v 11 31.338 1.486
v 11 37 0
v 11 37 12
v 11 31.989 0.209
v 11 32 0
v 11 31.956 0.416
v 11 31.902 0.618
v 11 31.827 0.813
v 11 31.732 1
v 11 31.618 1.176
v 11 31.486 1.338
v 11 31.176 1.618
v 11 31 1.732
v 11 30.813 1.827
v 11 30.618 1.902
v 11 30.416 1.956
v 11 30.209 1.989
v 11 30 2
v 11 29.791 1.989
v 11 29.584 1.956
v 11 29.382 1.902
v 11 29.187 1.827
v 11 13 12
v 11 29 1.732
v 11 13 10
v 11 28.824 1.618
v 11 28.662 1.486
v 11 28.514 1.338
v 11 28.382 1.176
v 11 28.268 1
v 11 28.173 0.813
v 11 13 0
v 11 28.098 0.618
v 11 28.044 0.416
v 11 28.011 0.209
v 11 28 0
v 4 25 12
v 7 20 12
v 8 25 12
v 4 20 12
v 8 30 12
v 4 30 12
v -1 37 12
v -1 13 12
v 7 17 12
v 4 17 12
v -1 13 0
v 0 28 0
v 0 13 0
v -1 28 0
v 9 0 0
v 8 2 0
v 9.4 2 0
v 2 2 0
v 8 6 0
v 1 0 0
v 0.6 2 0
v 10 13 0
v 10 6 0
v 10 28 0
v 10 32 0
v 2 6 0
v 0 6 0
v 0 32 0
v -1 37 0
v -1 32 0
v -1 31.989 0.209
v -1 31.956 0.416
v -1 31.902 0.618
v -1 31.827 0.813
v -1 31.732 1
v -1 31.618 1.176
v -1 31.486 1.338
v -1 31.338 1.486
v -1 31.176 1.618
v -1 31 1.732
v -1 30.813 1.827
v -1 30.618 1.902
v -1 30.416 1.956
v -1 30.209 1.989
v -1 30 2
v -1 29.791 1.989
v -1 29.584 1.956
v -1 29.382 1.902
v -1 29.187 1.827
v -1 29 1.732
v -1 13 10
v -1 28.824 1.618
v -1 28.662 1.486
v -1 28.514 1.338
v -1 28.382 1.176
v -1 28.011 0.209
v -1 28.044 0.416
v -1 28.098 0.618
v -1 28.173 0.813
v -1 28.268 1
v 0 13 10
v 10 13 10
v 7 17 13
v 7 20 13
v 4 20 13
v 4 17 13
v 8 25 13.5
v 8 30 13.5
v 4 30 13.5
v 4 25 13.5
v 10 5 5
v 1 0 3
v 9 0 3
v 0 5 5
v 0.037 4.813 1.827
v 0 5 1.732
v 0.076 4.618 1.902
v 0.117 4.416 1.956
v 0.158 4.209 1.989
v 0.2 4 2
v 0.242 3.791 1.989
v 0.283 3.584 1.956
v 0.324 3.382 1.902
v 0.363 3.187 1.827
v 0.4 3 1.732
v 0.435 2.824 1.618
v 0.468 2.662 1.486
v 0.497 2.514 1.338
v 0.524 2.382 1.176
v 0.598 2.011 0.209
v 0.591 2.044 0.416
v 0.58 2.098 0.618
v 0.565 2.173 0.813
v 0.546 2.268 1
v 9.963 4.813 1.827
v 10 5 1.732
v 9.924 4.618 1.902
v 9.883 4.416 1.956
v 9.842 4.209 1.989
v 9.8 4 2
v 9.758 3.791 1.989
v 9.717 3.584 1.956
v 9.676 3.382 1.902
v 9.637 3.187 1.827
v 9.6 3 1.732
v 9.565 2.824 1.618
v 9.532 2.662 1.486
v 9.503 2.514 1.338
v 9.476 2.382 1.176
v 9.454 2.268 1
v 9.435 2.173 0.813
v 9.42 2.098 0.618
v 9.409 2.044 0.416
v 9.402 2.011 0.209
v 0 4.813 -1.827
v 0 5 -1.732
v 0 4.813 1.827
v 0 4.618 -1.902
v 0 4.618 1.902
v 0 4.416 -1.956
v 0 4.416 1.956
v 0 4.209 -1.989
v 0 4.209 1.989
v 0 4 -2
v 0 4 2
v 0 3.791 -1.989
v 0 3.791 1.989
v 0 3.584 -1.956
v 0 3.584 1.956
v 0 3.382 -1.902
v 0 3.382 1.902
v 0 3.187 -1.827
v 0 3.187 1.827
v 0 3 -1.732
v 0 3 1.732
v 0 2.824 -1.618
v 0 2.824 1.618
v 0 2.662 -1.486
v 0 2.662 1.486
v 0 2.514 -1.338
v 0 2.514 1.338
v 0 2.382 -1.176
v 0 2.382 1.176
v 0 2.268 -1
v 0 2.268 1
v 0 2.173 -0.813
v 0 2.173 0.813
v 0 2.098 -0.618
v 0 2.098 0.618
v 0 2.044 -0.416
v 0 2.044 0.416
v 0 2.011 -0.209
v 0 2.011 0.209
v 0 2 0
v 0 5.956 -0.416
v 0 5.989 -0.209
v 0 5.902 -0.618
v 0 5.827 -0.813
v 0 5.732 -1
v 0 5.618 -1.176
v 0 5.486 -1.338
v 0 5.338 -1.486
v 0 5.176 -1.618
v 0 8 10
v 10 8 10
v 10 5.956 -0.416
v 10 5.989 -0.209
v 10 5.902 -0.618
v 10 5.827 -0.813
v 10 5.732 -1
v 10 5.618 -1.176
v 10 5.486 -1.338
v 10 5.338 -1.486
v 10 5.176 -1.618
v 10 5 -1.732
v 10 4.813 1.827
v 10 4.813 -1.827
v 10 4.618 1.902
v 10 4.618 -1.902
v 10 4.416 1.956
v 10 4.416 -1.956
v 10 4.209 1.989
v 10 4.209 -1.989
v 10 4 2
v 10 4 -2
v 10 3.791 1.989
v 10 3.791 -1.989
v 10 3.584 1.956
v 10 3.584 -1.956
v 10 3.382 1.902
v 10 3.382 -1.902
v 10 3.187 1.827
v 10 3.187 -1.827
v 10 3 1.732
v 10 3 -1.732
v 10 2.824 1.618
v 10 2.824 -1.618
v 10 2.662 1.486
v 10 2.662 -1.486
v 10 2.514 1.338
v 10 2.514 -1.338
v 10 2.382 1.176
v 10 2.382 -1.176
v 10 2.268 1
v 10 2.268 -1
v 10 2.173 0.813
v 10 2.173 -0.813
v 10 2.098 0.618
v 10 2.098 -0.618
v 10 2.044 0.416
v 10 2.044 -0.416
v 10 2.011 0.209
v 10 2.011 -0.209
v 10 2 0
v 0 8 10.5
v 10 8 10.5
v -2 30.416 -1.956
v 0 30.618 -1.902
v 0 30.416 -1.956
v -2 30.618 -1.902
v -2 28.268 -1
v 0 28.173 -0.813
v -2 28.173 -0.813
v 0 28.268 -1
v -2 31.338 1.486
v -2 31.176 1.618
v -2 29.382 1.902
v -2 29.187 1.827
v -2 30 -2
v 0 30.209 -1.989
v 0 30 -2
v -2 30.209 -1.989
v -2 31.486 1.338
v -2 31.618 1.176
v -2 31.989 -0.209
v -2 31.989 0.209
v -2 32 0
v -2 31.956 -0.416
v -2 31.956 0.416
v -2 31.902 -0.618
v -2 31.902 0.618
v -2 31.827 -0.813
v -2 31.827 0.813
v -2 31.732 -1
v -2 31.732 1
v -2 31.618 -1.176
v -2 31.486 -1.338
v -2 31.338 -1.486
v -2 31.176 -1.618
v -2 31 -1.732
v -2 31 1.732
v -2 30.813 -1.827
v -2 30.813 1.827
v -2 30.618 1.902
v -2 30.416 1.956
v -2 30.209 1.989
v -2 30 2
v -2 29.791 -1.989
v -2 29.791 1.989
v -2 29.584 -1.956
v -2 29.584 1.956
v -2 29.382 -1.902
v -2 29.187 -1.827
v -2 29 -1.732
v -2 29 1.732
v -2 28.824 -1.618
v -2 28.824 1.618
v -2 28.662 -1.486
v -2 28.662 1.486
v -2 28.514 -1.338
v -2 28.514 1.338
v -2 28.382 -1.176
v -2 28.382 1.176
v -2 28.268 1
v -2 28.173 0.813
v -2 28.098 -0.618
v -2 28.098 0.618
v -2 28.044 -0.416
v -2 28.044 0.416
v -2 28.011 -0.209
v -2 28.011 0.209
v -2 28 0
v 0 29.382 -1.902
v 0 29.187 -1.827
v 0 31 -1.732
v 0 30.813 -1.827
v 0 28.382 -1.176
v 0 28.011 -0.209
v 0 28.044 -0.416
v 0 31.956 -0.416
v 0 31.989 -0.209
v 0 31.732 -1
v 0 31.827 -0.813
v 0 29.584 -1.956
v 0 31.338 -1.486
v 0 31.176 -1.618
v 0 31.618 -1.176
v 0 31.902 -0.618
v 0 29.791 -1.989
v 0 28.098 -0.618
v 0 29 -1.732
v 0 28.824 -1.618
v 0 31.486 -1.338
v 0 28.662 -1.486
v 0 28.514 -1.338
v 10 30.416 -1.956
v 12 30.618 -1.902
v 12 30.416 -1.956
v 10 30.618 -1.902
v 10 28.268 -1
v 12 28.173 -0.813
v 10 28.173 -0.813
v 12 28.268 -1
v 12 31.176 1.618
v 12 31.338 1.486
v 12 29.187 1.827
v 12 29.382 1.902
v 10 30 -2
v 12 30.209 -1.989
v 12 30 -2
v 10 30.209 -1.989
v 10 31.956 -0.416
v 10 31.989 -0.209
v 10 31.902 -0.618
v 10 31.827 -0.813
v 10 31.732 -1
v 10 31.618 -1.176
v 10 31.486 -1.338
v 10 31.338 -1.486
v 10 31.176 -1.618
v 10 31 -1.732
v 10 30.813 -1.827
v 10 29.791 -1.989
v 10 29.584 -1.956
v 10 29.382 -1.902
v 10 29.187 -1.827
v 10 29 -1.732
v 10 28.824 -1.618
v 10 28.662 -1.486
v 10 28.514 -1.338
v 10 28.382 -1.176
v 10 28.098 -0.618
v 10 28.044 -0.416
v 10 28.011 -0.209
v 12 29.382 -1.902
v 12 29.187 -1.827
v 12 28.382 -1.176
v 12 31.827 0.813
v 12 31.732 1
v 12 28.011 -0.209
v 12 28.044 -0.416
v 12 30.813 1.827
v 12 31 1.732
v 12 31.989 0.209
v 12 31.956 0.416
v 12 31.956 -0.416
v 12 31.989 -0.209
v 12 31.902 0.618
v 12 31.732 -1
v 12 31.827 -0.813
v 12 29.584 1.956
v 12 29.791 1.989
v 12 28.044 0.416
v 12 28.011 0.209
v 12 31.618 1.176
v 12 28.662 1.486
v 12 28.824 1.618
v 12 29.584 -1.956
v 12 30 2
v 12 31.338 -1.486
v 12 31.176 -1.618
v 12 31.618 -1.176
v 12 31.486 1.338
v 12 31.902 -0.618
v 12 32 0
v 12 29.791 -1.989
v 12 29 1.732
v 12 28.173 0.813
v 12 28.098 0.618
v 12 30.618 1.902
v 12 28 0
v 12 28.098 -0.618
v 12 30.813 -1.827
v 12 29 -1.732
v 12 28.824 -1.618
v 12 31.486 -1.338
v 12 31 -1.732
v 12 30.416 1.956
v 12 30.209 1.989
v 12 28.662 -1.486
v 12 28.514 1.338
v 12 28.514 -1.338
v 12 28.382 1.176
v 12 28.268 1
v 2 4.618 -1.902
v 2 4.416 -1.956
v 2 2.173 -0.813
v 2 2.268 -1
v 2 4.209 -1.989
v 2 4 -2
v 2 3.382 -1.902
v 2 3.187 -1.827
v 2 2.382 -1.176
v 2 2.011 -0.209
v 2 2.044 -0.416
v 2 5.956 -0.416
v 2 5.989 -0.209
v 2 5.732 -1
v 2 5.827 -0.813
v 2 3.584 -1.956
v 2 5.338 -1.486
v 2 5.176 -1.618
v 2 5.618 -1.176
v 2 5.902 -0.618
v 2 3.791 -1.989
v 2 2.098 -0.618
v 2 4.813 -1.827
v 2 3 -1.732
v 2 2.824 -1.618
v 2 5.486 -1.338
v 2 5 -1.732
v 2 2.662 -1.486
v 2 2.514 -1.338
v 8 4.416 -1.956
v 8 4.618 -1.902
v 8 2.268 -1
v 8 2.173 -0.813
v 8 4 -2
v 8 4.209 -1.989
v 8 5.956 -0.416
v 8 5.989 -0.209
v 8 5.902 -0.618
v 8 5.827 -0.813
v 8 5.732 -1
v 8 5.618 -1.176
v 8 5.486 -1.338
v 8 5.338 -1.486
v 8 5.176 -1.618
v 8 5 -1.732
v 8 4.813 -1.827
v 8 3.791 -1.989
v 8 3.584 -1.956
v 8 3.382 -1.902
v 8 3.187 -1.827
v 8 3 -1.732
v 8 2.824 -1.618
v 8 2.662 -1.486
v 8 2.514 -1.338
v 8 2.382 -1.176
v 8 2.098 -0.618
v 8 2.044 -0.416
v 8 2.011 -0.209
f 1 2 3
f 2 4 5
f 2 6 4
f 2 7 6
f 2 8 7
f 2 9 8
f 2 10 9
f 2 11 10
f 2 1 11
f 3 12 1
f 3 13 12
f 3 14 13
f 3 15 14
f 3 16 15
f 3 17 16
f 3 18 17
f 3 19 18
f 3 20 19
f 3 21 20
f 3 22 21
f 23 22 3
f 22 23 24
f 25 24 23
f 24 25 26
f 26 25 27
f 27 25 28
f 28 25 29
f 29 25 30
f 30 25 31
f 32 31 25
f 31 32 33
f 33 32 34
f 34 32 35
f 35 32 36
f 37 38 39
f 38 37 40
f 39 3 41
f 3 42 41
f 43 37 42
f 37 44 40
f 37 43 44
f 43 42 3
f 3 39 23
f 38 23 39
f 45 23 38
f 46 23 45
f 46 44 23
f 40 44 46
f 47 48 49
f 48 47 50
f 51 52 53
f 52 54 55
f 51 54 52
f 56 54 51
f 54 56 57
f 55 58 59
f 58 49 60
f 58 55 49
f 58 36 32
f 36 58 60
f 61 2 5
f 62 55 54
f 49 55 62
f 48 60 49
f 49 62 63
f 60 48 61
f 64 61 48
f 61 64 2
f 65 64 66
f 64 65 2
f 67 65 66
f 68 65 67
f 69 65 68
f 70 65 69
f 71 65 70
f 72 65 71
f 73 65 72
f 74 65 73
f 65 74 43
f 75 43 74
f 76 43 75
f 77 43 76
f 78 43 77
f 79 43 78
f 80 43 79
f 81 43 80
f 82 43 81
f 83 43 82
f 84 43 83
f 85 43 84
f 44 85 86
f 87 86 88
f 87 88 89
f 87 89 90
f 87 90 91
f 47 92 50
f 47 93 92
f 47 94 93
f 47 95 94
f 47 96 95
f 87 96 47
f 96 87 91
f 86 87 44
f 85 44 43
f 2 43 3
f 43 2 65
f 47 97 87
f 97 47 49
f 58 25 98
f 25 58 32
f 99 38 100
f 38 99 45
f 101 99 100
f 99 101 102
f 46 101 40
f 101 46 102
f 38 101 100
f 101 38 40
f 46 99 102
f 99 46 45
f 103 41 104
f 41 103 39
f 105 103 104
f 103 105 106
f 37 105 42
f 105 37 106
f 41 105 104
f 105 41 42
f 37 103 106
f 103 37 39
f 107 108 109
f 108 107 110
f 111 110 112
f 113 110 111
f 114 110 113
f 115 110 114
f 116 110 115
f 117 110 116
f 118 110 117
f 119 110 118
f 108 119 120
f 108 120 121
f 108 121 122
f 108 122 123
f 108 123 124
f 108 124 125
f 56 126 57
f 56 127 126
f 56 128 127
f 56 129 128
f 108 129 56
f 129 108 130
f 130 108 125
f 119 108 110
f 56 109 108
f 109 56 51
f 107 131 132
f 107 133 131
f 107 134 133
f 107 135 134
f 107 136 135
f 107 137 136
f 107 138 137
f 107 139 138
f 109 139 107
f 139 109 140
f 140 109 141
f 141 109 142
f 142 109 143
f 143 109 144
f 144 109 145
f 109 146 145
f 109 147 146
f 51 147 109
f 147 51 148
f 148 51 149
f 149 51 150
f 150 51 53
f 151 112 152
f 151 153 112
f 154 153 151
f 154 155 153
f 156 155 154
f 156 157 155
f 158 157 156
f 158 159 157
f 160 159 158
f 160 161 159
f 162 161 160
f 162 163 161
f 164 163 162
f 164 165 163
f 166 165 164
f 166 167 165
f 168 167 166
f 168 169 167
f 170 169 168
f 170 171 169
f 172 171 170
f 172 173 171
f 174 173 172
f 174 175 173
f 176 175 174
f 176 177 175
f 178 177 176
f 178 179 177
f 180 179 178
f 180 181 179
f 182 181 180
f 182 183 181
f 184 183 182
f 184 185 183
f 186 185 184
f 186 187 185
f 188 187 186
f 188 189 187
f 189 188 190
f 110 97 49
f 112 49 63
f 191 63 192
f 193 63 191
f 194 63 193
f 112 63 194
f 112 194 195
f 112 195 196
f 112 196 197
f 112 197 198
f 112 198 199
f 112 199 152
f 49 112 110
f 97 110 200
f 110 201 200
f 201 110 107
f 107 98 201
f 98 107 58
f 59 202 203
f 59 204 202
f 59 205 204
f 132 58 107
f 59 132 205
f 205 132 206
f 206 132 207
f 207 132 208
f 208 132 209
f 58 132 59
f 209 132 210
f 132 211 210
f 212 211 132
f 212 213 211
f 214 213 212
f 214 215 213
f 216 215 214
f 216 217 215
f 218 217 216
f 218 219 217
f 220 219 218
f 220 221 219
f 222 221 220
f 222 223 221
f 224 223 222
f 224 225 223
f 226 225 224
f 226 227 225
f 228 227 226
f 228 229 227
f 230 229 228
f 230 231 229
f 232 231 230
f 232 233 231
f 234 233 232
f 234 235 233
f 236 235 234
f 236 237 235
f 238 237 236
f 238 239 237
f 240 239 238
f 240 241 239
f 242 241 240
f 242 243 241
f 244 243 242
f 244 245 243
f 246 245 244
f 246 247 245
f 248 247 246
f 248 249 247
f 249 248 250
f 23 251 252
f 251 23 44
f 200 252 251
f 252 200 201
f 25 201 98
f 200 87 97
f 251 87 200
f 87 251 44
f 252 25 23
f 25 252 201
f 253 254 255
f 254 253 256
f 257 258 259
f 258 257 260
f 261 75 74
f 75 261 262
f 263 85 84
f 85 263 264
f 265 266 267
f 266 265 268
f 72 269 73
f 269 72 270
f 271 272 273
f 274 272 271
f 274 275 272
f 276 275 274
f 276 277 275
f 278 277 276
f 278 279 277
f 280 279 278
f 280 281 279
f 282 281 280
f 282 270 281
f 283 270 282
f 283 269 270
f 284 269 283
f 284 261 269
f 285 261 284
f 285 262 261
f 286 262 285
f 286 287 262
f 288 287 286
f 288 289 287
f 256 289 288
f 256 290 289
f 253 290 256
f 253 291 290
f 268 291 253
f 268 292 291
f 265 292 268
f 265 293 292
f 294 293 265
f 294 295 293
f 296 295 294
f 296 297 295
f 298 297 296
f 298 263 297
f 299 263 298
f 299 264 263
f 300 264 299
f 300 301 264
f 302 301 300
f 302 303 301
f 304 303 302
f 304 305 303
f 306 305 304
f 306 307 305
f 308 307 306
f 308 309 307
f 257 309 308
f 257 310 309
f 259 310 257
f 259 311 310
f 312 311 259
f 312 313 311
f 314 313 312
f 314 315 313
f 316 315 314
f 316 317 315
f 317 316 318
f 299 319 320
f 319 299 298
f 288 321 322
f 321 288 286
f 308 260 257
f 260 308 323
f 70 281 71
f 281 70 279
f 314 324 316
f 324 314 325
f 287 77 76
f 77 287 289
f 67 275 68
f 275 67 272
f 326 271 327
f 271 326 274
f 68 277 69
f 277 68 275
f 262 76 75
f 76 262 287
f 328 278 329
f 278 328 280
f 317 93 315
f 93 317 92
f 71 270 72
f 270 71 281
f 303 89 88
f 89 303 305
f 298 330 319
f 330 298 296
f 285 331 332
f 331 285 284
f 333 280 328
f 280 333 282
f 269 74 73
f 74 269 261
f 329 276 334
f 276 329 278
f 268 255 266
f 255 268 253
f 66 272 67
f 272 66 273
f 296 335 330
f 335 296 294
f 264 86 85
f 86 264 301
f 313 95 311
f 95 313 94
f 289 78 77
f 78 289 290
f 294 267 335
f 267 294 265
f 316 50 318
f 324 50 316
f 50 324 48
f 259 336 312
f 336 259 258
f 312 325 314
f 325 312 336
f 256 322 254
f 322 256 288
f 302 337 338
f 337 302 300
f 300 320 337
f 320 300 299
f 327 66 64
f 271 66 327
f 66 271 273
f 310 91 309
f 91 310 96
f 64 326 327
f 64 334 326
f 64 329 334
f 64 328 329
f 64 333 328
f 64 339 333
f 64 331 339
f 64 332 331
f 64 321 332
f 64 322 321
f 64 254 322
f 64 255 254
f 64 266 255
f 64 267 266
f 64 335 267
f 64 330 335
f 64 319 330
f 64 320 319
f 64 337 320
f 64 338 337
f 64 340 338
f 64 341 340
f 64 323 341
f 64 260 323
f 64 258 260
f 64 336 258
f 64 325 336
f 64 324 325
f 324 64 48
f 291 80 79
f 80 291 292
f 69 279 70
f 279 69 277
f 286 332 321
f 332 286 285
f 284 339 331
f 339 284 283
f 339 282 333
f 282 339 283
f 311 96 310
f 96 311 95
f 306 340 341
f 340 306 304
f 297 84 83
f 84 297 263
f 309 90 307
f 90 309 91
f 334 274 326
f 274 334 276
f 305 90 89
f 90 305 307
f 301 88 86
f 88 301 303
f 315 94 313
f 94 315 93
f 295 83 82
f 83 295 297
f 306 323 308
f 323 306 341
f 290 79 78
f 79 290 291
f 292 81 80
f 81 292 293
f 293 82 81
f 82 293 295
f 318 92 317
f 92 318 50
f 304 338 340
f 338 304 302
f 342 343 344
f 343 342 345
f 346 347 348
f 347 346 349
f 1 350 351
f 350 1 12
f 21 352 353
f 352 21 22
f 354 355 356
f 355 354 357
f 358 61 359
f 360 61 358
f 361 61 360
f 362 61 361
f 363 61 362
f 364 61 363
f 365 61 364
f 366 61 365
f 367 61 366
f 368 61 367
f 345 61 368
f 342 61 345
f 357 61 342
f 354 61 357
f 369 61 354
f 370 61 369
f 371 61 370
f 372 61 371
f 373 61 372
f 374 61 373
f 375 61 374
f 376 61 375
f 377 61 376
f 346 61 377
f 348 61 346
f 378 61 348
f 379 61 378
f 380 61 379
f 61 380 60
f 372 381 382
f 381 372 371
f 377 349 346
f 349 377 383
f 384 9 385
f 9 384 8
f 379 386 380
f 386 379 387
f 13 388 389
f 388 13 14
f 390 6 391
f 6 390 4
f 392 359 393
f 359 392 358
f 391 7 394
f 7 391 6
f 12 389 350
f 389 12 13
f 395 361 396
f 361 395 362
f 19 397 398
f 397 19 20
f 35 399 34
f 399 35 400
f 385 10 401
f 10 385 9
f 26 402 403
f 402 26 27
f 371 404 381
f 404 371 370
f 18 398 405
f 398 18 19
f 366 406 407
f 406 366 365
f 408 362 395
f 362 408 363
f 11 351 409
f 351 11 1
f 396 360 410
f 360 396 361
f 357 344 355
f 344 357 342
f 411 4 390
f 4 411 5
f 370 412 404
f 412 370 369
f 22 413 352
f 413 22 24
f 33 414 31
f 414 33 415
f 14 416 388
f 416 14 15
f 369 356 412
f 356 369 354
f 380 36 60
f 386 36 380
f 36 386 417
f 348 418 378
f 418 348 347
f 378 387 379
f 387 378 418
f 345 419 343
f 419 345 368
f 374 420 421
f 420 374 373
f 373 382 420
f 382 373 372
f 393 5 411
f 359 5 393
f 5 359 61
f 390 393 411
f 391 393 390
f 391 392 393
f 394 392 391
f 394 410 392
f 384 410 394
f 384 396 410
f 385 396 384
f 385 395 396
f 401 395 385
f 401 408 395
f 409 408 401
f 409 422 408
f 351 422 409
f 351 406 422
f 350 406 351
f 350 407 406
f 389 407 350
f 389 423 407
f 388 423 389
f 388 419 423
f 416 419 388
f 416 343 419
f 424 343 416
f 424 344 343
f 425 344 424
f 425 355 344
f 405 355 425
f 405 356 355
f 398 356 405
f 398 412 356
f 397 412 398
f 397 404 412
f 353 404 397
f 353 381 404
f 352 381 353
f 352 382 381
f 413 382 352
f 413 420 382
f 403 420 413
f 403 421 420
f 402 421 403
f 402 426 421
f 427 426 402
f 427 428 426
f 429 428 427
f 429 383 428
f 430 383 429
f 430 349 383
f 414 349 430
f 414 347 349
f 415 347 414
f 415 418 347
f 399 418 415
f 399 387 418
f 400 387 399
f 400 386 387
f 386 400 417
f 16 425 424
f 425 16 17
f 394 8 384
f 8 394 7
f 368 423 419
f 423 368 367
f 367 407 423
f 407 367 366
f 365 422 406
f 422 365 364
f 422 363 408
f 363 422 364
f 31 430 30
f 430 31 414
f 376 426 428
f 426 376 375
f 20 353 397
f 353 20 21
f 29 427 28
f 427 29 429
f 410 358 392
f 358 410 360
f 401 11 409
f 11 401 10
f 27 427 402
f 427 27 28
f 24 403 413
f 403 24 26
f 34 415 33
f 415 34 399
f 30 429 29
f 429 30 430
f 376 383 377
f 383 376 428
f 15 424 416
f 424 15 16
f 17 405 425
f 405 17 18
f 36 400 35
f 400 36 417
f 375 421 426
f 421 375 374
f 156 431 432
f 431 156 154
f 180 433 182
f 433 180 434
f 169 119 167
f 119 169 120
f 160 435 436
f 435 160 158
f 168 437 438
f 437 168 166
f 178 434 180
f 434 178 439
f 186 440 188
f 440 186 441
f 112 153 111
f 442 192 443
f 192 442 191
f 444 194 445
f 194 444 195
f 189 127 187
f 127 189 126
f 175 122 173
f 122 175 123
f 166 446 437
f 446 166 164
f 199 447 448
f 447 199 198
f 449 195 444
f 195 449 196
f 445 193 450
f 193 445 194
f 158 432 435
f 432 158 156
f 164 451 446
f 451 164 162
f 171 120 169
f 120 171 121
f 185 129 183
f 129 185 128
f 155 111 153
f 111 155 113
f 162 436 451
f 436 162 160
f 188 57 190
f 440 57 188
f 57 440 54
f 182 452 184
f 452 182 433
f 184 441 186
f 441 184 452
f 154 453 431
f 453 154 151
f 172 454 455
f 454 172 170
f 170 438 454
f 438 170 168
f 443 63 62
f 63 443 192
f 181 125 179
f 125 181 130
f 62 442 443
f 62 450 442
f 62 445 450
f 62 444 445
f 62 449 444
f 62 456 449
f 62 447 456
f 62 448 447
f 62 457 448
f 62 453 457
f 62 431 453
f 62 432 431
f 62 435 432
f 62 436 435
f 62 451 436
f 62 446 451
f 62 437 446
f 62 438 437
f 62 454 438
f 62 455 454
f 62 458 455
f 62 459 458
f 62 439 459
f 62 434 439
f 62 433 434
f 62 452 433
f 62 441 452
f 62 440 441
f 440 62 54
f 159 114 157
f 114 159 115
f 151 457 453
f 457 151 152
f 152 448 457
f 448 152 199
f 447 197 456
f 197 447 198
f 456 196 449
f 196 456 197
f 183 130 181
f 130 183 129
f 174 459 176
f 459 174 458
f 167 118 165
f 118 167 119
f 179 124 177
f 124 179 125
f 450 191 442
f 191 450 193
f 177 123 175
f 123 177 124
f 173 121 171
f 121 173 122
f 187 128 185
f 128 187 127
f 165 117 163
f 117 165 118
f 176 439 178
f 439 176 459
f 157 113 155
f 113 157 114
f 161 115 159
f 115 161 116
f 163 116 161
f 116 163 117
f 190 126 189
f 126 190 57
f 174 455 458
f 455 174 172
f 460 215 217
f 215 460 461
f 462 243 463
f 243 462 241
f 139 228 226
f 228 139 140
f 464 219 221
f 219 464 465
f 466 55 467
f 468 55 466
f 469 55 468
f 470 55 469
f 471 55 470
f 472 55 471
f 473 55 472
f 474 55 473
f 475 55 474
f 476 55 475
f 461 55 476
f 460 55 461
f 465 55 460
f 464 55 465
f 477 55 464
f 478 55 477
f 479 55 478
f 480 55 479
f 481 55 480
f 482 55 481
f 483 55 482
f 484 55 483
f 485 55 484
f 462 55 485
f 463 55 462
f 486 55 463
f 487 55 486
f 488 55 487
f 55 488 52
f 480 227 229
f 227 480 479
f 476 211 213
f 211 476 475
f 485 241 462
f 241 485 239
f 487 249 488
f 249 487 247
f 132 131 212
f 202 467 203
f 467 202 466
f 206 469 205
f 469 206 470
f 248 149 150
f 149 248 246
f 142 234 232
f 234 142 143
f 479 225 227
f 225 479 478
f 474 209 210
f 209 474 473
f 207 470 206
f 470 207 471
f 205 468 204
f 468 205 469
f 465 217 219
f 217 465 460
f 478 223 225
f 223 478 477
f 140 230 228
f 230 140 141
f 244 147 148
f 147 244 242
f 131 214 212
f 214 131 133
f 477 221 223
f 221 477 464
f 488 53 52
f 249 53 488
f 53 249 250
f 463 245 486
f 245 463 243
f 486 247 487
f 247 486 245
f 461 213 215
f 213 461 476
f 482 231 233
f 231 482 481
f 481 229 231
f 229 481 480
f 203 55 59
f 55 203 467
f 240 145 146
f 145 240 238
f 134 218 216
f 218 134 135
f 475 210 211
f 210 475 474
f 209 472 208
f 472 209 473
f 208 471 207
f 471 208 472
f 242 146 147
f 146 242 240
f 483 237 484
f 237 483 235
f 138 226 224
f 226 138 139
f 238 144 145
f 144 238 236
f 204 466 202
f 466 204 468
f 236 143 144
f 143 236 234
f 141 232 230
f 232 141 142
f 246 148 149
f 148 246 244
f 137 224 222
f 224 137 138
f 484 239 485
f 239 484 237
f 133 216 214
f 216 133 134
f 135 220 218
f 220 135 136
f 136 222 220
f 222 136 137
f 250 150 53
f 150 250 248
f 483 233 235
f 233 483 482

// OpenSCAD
HoodPoints = [
  [  1,  0,  0 ],  //0
  [ 9,  0,  0 ],  //1
  [ 10,  5,  0 ],  //2
  [  0,  5,  0 ],  //3
  [  1,  0,  3 ],  //4
  [ 9,  0,  3 ],  //5
  [ 10,  5,  5 ],  //6
  [  0,  5,  5 ]]; //7
  
HoodFaces = [
  [0,1,2,3],  // bottom
  [4,5,1,0],  // front
  [7,6,5,4],  // top
  [5,6,2,1],  // right
  [6,7,3,2],  // back
  [7,4,0,3]]; // left
  
polyhedron( HoodPoints, HoodFaces );

CabPoints = [
  [  0,  5,  0 ],  //0
  [ 10,  5,  0 ],  //1
  [ 10,  8,  0 ],  //2
  [  0,  8,  0 ],  //3
  [  0,  5,  5 ],  //4
  [ 10,  5,  5 ],  //5
  [ 10,  8,  10 ],  //6
  [  0,  8,  10 ]]; //7
  
CabFaces = [
  [0,1,2,3],  // bottom
  [4,5,1,0],  // front
  [7,6,5,4],  // top
  [5,6,2,1],  // right
  [6,7,3,2],  // back
  [7,4,0,3]]; // left
  
polyhedron(CabPoints, CabFaces);

CoverPoints = [
  [  0,  8,  10 ],  //0
  [ 10,  8,  10 ],  //1
  [ 11,  13,  10 ],  //2
  [  -1,  13,  10 ],  //3
  [  0,  8,  10.5 ],  //4
  [ 10,  8,  10.5 ],  //5
  [ 11,  13,  12 ],  //6
  [  -1,  13,  12 ]]; //7
  
CoverFaces = [
  [0,1,2,3],  // bottom
  [4,5,1,0],  // front
  [7,6,5,4],  // top
  [5,6,2,1],  // right
  [6,7,3,2],  // back
  [7,4,0,3]]; // left
  
polyhedron(CoverPoints, CoverFaces);

$fn = 60;
translate([-2, 30, 0]) rotate([0,90,0]) cylinder(r=2, h=2);
translate([10, 30, 0]) rotate([0,90,0]) cylinder(r=2, h=2);

translate([0, 4, 0]) rotate([0,90,0]) cylinder(r=2, h=2);
translate([8, 4, 0]) rotate([0,90,0]) cylinder(r=2, h=2);

translate([0,8,0]) cube([10,5,10]);

translate([0,5,0]) {
    translate([-1,8,0]) cube([12,24,12]);
    translate([(12/2)-(4/2),12,12]) cube([3,3,1]);
    translate([(12/2)-(4/2),20,12]) cube([4,5,1.5]);
}
